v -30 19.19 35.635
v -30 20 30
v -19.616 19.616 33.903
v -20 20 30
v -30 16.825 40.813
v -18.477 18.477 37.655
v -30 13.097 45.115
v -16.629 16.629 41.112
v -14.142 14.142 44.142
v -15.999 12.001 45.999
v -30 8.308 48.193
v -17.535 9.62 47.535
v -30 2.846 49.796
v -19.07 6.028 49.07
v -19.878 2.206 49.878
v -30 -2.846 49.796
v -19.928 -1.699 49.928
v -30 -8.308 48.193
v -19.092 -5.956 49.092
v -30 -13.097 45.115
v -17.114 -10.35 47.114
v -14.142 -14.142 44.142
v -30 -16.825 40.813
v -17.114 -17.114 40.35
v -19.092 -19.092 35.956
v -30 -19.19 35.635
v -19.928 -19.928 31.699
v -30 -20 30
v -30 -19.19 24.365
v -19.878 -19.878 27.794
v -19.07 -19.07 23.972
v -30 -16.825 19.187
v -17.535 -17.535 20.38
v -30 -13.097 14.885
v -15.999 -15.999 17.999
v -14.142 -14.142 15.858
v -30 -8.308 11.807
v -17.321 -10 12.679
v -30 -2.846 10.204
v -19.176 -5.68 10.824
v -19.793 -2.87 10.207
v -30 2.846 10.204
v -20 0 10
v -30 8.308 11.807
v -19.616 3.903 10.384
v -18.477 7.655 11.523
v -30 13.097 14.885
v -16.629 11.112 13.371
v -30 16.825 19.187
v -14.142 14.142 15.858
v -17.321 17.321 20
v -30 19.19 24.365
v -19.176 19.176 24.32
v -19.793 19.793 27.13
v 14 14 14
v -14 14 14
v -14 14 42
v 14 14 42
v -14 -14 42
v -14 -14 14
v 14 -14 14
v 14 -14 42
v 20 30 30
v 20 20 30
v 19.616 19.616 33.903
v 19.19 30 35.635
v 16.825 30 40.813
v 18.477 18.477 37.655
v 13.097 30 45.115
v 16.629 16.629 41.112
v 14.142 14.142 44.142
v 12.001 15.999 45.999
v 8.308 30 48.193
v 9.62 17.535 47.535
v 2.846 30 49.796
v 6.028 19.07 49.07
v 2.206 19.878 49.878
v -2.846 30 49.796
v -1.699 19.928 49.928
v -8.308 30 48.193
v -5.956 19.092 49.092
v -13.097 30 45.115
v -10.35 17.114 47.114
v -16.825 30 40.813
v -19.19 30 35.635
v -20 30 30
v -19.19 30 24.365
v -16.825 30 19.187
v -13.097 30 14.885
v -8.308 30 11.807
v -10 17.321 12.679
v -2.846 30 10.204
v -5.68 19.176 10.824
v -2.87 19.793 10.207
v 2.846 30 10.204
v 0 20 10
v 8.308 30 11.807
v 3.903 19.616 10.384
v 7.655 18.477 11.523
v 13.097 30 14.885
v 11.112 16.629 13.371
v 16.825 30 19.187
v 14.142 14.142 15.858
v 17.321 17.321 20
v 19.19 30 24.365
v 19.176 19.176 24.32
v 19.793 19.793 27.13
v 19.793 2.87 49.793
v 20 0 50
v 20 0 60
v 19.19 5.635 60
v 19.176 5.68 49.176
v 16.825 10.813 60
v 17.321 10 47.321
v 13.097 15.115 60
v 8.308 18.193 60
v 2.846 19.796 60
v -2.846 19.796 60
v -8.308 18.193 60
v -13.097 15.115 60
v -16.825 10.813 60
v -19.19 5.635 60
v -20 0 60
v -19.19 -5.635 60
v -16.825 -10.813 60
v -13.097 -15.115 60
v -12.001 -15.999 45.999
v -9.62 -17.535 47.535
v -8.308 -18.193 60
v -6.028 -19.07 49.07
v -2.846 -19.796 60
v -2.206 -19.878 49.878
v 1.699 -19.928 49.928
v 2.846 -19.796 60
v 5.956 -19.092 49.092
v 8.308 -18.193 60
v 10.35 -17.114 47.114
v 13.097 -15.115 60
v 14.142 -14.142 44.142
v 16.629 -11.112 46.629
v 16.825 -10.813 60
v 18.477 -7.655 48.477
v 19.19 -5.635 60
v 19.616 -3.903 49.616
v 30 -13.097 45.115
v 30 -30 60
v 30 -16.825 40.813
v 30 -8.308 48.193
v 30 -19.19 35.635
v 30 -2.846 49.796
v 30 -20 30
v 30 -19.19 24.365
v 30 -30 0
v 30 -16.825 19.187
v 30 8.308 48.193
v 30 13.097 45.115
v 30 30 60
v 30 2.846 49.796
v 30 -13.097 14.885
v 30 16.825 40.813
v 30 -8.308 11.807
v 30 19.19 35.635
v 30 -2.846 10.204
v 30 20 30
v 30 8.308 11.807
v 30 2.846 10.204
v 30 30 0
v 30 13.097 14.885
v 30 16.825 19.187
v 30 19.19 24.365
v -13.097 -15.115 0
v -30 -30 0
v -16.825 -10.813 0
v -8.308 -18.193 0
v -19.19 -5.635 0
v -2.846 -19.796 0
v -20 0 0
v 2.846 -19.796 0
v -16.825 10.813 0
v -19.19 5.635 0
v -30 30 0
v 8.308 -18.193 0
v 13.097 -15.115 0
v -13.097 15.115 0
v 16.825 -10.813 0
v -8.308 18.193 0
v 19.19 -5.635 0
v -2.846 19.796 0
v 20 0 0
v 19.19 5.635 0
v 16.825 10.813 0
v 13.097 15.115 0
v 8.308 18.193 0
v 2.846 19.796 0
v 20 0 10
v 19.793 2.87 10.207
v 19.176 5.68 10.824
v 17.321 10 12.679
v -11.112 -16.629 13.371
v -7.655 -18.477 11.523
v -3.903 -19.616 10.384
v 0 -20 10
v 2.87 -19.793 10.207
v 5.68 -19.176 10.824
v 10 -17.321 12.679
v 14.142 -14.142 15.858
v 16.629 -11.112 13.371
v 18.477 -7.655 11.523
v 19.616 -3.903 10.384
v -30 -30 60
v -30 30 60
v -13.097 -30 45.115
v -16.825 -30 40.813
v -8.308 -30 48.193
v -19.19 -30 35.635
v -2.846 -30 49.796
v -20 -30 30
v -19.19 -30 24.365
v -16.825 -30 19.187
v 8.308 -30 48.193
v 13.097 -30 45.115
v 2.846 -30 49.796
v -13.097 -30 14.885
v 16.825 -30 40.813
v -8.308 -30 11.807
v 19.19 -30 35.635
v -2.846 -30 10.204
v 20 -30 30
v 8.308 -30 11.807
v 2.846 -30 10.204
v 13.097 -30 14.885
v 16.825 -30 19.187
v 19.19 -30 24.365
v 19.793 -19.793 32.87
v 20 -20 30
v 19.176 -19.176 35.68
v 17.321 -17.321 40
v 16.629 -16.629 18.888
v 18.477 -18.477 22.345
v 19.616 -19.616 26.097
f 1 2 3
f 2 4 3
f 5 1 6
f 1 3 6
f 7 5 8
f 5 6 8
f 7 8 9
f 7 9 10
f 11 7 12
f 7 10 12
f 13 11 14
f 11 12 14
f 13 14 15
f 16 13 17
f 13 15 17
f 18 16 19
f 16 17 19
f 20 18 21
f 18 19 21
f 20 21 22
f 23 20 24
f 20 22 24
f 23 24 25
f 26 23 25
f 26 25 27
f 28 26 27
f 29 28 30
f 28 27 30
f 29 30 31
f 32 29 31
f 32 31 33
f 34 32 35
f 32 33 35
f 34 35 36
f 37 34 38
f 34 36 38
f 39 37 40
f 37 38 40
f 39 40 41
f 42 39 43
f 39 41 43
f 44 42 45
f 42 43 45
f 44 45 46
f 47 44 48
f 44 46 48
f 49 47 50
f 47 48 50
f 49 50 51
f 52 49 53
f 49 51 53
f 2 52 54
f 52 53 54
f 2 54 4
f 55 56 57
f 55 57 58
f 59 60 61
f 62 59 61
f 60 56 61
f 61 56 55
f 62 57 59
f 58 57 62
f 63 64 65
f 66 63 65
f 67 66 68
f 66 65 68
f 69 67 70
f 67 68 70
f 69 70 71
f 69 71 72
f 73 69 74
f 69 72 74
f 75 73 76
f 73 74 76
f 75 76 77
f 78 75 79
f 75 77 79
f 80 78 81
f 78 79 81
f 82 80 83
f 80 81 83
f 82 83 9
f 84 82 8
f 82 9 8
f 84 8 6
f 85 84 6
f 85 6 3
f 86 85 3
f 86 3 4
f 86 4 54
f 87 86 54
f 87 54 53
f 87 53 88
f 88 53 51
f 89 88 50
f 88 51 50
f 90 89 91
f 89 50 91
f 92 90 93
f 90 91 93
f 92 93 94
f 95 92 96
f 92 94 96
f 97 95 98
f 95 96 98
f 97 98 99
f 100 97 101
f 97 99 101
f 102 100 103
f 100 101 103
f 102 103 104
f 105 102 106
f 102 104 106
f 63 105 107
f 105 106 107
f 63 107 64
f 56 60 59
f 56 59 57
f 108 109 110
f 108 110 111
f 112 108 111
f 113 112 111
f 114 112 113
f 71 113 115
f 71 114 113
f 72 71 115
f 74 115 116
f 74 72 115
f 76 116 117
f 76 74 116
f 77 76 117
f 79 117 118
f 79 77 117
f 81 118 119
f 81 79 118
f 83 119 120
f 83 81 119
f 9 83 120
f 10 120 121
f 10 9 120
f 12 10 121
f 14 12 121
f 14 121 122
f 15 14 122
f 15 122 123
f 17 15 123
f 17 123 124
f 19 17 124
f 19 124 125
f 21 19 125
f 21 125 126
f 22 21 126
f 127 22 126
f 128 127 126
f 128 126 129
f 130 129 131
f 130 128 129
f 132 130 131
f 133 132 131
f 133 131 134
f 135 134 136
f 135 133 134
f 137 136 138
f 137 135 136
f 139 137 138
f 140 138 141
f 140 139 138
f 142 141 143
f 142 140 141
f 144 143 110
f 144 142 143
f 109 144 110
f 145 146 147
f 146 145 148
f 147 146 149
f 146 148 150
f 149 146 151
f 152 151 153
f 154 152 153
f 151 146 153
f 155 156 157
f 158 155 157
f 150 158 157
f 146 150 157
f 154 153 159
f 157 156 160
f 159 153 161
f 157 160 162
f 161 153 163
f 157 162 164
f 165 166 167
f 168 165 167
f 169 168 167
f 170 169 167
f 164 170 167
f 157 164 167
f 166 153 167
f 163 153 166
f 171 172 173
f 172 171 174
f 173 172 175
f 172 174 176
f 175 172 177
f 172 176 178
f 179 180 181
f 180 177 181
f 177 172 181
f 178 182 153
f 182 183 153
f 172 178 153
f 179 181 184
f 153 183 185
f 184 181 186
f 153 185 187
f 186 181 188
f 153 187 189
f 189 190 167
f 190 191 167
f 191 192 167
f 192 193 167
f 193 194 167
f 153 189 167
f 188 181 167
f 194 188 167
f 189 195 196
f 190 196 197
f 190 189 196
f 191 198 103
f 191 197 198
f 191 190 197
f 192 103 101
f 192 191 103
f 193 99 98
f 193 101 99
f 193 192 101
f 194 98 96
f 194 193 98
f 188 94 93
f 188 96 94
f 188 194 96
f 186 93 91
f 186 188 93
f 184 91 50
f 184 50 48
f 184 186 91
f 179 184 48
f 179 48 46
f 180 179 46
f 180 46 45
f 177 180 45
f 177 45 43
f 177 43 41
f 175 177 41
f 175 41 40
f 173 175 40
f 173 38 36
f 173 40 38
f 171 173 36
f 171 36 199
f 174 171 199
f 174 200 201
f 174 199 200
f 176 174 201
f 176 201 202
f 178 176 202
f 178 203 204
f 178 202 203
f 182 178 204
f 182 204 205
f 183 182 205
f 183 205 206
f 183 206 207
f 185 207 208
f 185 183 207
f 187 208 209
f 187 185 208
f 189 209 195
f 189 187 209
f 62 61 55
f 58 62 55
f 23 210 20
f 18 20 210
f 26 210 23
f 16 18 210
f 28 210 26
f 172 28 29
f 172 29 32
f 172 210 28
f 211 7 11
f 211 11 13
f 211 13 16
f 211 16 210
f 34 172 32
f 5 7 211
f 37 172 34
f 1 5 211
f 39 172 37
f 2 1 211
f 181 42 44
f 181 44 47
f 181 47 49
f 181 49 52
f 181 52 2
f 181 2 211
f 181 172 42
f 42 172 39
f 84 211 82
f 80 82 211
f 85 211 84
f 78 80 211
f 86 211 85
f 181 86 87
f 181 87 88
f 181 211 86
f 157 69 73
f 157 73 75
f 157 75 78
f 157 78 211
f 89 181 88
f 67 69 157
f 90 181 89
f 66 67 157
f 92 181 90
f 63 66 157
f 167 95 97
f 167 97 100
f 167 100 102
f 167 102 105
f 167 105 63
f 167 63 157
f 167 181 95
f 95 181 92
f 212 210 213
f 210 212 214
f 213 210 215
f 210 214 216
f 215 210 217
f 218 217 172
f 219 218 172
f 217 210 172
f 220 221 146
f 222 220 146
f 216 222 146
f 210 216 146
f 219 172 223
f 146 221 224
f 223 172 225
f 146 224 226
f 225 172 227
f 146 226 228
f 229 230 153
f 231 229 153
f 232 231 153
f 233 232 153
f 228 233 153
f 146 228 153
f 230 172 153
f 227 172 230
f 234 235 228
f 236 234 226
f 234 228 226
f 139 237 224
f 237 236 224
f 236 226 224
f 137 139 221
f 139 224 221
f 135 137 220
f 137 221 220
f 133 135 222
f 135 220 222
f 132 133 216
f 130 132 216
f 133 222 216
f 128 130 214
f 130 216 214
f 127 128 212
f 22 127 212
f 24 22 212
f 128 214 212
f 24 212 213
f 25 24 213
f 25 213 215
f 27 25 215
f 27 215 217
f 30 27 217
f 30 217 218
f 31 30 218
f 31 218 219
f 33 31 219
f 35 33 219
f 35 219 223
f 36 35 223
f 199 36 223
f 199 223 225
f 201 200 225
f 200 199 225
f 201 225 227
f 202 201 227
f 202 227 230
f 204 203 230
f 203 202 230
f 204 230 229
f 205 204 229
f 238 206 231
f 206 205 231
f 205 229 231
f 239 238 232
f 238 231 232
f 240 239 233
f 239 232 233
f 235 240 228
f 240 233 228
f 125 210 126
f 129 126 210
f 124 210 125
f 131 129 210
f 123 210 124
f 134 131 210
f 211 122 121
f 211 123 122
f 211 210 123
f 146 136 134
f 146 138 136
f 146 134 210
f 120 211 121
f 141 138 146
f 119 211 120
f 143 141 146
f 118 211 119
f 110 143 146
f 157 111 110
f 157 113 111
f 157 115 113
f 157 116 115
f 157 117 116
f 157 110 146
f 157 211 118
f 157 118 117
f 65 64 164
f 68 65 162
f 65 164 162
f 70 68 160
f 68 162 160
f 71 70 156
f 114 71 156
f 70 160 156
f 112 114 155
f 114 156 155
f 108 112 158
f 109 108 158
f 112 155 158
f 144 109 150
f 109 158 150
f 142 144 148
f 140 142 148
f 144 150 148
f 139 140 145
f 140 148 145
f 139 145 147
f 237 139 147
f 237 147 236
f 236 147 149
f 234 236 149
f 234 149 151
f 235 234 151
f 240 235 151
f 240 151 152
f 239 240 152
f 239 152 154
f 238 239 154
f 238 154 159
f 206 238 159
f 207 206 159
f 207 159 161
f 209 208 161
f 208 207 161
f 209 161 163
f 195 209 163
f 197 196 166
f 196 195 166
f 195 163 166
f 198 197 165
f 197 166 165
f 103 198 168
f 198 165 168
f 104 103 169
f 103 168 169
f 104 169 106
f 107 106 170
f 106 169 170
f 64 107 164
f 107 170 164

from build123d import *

# Parameters (mm, degrees)
F0_W     = 60
F0_H     = 60
F0_R     = 20
F1_DEPTH = 60
F2_R     = 20
F3_DEPTH = 30
F4_R     = 20
F5_DEPTH = 30
F6_START = 14
F0_W_2   = 28
F0_H_2   = 28
F6_DEPTH = 28


with BuildPart() as f1:
    # F0 (on Top) → F1 (new body)
    with BuildSketch(Plane.XY):
        Rectangle(F0_W, F0_H)
        Circle(F0_R, mode=Mode.SUBTRACT)
    extrude(amount=F1_DEPTH)

    # F2 (on Right) → F3 (cut, symmetric)
    with BuildSketch(Plane.YZ):
        with Locations((0, 30)):
            Circle(F2_R)
    extrude(amount=F3_DEPTH, both=True, mode=Mode.SUBTRACT)

    # F4 (on Front) → F5 (cut, symmetric)
    with BuildSketch(Plane.XZ):
        with Locations((0, 30)):
            Circle(F4_R)
    extrude(amount=F5_DEPTH, both=True, mode=Mode.SUBTRACT)


with BuildPart() as f6:
    # F0 (on Top) → F6 (new body)
    with BuildSketch(Plane.XY.offset(F6_START)):
        Rectangle(F0_W_2, F0_H_2)
    extrude(amount=F6_DEPTH)


solid = Compound([f1.part, f6.part])
